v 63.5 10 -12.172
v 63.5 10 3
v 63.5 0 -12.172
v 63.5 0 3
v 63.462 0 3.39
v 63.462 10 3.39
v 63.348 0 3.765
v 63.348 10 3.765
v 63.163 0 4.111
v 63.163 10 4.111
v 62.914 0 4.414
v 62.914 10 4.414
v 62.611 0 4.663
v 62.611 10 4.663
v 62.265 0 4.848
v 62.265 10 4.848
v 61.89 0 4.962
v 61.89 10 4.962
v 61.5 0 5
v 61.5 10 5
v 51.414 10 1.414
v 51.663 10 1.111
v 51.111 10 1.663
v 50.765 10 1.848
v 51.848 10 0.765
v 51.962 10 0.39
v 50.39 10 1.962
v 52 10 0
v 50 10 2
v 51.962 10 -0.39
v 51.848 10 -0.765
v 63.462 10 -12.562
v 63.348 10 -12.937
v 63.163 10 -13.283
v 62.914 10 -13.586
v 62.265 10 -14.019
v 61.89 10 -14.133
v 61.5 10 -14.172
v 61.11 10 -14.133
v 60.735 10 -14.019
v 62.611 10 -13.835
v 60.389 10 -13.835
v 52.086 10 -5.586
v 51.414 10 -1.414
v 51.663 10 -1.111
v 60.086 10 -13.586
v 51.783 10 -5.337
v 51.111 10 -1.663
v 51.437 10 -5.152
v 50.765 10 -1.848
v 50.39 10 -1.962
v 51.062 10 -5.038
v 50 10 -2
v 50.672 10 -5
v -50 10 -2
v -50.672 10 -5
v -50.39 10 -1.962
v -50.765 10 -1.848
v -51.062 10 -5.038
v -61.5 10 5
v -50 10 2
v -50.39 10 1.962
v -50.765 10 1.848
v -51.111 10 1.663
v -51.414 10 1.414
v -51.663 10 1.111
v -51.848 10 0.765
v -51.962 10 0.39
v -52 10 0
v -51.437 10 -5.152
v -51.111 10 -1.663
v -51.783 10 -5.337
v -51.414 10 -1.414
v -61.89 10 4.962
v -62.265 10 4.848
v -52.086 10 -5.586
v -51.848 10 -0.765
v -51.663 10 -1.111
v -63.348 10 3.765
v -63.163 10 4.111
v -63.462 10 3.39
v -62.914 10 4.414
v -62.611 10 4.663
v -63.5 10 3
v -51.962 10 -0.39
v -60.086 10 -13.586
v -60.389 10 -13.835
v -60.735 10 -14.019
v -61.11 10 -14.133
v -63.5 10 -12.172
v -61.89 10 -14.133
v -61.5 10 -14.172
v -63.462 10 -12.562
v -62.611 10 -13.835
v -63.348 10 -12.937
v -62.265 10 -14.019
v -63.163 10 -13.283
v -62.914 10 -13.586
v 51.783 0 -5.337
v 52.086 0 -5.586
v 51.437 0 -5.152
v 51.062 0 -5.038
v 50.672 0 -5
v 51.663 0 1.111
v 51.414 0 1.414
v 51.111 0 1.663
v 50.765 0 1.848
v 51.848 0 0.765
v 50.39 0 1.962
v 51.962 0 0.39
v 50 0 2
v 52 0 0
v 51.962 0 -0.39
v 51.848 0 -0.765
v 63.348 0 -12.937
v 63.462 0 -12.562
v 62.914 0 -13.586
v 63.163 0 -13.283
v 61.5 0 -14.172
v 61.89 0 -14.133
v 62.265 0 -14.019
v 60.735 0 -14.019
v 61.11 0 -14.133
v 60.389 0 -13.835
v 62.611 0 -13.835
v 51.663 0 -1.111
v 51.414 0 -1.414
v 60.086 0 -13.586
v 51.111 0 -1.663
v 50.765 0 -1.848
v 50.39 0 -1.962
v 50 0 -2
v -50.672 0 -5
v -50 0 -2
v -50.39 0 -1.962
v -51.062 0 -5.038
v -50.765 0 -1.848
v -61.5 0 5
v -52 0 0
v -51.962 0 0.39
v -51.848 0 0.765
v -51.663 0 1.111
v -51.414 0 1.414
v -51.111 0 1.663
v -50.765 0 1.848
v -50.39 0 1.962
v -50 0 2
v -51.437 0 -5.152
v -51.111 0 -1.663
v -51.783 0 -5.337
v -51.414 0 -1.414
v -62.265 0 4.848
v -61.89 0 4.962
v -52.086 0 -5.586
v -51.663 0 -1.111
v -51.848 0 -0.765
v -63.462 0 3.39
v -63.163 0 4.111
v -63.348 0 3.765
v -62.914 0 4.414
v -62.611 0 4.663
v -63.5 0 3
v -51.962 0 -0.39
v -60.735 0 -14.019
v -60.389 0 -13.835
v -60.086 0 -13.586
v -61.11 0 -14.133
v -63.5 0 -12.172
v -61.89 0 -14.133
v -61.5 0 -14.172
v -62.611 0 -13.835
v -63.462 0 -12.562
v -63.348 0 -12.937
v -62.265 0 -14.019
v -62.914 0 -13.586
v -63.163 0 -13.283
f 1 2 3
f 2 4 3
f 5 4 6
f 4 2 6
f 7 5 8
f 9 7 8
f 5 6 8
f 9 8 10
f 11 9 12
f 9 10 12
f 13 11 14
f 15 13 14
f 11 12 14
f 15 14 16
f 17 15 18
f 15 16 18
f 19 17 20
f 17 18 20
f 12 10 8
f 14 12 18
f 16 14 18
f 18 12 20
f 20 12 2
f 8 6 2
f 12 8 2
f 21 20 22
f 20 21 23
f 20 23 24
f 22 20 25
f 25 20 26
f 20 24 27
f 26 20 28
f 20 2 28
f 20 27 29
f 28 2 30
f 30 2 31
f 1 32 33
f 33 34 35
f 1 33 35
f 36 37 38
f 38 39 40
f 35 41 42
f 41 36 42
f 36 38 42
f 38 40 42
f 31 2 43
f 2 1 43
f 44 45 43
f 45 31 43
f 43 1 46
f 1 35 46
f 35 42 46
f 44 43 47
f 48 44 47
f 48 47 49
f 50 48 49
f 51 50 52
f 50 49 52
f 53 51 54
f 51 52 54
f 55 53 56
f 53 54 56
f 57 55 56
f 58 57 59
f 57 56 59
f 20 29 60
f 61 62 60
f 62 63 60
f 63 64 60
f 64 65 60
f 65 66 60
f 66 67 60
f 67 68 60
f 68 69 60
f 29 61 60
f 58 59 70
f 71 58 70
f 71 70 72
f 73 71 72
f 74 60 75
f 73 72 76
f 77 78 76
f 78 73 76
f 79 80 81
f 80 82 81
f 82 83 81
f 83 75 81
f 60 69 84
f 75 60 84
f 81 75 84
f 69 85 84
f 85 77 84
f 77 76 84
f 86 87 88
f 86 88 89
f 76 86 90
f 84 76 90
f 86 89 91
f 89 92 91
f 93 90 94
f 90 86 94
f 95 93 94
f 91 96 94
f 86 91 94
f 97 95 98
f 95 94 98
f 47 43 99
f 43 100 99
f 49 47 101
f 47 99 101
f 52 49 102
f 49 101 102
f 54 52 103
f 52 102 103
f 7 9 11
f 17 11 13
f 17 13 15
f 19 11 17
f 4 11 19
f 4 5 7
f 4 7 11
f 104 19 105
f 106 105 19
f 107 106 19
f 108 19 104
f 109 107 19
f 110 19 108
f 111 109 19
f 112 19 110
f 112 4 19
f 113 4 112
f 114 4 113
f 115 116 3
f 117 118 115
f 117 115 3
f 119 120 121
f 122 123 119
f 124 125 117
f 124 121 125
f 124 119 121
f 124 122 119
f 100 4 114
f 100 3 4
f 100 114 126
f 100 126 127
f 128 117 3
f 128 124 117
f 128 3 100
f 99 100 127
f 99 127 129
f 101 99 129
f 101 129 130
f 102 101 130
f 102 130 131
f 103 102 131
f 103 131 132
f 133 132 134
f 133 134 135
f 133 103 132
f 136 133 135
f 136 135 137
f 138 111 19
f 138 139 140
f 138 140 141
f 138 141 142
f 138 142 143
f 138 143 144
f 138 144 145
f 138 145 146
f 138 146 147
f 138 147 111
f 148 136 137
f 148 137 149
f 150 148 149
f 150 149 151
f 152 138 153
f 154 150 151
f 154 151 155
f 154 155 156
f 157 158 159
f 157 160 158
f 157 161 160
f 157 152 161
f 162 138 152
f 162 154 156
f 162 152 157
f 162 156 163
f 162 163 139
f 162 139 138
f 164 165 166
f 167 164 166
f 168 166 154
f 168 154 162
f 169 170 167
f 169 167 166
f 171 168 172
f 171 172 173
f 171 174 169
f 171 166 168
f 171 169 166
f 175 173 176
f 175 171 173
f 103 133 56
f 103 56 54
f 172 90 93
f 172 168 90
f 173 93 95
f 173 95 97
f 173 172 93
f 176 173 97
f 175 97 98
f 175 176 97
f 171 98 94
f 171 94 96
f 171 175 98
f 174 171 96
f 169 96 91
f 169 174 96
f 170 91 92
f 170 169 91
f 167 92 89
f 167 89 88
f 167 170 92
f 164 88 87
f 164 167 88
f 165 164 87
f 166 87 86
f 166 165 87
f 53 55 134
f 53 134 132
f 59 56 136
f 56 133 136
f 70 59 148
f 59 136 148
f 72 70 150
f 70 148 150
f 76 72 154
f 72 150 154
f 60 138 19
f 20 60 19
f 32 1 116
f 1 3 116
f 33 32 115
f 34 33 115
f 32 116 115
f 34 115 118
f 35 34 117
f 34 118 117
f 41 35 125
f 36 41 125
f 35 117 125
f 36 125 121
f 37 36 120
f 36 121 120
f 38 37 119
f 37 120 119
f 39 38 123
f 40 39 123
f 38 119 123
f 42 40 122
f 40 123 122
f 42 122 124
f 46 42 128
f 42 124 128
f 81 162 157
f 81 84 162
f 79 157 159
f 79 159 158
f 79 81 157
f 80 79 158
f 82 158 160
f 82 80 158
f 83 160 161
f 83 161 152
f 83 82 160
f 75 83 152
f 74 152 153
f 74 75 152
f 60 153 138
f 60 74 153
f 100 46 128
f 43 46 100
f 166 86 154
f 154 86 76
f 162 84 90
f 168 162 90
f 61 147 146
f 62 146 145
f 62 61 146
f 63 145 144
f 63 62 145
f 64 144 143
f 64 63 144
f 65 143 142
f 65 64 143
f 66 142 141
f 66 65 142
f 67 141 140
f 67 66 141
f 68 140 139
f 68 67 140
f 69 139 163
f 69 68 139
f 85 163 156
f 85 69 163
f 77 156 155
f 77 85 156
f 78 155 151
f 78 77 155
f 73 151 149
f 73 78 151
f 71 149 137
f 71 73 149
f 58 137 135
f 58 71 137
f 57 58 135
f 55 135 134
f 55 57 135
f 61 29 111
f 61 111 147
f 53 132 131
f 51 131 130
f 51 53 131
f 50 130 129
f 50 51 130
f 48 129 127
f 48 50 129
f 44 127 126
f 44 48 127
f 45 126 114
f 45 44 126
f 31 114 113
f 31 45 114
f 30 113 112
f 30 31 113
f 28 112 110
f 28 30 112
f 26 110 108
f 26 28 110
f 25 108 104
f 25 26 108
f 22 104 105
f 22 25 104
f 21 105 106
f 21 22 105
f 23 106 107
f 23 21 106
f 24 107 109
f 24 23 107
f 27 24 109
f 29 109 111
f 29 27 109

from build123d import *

# Parameters (mm, degrees)
SKETCH1_W           = 127
SKETCH1_H           = 10
BOSS_EXTRUDE1_DEPTH = 10
BOSS_EXTRUDE2_DEPTH = 10
FILLET1_R           = 2
CUT_EXTRUDE1_REACH  = 12


with BuildPart() as part:
    # Sketch1 → Boss-Extrude1 (new body)
    with BuildSketch(Plane(origin=(0, 0, 0), x_dir=(1, 0, 0), z_dir=(0, 1, 0))):
        Rectangle(SKETCH1_W, SKETCH1_H)
    extrude(amount=BOSS_EXTRUDE1_DEPTH)

    # Sketch2 → Boss-Extrude2 (add)
    with BuildSketch(Plane(origin=(0, 10, 0), x_dir=(1, 0, 0), z_dir=(0, 1, 0))):
        Polygon((-63.5, 5), (-63.5, 17), (-51.5, 5), align=None)
        Polygon((51.5, 5), (63.5, 5), (63.5, 17), align=None)
    extrude(amount=-BOSS_EXTRUDE2_DEPTH)

    # Fillet1
    fillet1_edges = [part.edges().sort_by_distance(p)[0] for p in [
        (-51.5, 5, -5),
        (-63.5, 5, -17),
        (51.5, 5, -5),
        (63.5, 5, -17),
        (63.5, 5, 5),
        (-63.5, 5, 5),
    ]]
    fillet(fillet1_edges, radius=FILLET1_R)

    # Sketch4 → Cut-Extrude1 (cut, up to next)
    with BuildSketch(Plane(origin=(0, 10, 0), x_dir=(1, 0, 0), z_dir=(0, 1, 0)), mode=Mode.PRIVATE) as cut_extrude1_sk1:
        with BuildLine():
            Line((-50, 2), (50, 2))
            ThreePointArc((50, 2), (52, 0), (50, -2))
            Line((50, -2), (-50, -2))
            ThreePointArc((-50, -2), (-52, 0), (-50, 2))
        make_face()
    cut_extrude1_tool1 = extrude(cut_extrude1_sk1.sketch, amount=-CUT_EXTRUDE1_REACH, mode=Mode.PRIVATE) & part.part
    add(cut_extrude1_tool1.solids().sort_by_distance((0, 10, 0))[0], mode=Mode.SUBTRACT)


solid = part.part
